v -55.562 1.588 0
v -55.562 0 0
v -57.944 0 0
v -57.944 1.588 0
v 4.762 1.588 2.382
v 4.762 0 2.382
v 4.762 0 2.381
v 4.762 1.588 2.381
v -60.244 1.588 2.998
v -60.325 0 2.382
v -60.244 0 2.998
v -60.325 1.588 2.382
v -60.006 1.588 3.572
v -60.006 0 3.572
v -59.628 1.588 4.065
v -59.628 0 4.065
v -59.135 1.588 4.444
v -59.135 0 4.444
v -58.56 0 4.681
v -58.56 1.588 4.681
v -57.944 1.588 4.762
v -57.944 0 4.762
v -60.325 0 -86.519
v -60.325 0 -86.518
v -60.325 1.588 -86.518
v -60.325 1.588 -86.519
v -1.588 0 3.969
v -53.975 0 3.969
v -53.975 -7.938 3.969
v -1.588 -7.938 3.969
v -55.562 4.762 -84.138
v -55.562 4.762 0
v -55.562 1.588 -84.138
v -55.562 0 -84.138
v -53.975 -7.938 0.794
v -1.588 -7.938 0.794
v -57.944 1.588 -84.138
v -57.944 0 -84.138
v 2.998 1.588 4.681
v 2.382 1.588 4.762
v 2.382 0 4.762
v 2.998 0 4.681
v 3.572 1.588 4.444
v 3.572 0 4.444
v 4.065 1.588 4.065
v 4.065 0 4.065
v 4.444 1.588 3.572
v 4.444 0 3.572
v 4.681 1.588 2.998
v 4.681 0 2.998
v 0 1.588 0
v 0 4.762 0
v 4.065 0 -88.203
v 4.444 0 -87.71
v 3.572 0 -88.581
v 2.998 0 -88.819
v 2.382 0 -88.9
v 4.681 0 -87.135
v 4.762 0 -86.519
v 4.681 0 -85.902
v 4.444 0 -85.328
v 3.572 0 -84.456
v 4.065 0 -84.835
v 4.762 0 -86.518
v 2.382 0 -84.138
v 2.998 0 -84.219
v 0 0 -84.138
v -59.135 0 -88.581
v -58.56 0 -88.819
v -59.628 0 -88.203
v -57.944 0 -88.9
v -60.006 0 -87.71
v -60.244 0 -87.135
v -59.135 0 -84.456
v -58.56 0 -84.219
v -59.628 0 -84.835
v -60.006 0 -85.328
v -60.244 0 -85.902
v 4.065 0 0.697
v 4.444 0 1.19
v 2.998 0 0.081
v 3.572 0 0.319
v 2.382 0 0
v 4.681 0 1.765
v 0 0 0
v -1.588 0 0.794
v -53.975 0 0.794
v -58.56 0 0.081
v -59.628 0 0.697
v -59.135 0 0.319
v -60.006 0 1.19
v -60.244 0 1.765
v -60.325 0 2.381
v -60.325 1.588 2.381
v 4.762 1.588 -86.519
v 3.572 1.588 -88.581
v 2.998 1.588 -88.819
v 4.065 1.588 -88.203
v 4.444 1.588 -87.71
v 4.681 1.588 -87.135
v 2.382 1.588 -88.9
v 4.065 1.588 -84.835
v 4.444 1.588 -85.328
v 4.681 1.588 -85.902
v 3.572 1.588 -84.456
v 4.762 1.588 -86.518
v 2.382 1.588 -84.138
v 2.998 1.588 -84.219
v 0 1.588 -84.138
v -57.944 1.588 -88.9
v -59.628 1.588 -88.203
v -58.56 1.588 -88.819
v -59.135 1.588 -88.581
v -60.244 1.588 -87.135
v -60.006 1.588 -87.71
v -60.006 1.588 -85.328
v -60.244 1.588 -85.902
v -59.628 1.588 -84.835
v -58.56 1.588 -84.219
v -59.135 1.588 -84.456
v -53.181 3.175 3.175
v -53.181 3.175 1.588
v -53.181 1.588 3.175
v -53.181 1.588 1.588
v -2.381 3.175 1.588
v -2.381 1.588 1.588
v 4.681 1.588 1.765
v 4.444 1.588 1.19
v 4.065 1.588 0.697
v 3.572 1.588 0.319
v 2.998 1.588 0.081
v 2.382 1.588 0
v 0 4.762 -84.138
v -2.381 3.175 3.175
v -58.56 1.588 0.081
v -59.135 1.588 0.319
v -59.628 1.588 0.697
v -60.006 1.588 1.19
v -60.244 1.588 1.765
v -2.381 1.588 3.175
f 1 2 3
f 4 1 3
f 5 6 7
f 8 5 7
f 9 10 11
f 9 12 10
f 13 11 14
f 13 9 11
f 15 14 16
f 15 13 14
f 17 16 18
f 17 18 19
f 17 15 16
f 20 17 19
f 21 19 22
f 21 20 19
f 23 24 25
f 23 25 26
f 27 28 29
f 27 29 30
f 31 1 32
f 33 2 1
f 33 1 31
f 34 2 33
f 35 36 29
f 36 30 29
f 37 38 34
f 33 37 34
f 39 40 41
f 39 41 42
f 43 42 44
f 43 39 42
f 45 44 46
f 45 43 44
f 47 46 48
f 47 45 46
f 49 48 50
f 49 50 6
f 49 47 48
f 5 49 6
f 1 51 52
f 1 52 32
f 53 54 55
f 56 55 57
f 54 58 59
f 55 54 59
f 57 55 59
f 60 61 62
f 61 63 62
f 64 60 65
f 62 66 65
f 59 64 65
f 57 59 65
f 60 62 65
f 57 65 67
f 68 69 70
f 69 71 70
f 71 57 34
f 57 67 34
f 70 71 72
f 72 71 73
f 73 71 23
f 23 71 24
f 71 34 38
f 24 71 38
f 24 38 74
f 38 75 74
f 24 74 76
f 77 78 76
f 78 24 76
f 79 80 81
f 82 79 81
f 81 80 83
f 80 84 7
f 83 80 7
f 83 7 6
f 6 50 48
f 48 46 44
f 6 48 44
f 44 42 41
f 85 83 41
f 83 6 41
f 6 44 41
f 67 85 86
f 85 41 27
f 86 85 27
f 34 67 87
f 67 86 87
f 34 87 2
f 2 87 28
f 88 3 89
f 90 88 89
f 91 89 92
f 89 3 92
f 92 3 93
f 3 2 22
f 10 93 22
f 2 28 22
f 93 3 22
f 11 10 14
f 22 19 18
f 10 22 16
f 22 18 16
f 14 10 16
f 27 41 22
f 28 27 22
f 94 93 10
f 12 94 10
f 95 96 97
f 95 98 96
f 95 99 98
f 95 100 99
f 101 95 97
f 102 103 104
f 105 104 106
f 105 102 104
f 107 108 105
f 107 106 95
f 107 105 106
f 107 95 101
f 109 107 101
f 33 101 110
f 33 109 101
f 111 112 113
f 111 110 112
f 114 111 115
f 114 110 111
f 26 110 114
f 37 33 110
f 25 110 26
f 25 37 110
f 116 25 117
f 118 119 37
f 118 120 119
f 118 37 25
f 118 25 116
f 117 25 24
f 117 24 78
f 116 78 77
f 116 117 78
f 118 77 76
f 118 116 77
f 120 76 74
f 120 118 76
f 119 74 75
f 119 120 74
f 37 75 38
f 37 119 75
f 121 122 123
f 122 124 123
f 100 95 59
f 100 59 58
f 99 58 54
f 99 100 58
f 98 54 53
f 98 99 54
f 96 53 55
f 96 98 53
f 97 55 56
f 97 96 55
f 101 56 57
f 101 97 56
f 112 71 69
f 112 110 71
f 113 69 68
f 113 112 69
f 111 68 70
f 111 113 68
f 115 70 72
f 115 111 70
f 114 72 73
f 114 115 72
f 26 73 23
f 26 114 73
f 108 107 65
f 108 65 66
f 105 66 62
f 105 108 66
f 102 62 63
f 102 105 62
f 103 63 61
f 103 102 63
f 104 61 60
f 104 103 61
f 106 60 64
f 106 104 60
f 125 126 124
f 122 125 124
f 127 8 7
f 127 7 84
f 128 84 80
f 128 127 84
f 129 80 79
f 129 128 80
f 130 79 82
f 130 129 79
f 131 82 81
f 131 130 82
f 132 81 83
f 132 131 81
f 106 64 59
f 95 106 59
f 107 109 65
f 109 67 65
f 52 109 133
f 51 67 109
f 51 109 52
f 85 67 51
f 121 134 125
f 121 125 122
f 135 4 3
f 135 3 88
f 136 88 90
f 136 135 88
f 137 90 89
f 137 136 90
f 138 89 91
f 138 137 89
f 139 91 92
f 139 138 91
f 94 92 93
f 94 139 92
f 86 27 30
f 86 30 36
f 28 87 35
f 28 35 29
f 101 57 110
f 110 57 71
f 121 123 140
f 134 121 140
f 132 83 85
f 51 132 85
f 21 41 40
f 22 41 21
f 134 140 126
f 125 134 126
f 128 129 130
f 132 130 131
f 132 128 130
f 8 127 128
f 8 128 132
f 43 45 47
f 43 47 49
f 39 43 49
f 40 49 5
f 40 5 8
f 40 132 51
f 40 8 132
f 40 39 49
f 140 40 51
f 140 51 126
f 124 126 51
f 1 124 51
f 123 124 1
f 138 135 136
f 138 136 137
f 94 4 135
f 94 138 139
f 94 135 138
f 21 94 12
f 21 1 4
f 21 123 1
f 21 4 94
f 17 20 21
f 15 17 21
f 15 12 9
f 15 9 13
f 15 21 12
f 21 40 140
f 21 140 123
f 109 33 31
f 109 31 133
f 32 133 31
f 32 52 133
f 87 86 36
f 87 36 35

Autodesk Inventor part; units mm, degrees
ref_plane "YZ Plane" through (0, 0, 0) normal (1, 0, 0) x (0, 1, 0)
ref_plane "XZ Plane" through (0, 0, 0) normal (0, 1, 0) x (-1, 0, 0)
ref_plane "XY Plane" through (0, 0, 0) normal (0, 0, 1) x (1, 0, 0)
sketch "Sketch1" plane through (0, 0, 0) normal (0, 1, 0) x (-1, 0, 0)
  line L0 (0, 0) -> (55.5625, 0)
  line L1 (55.5625, 0) -> (55.5625, -84.1375)
  line L2 (55.5625, -84.1375) -> (0, -84.1375)
  line L3 (0, -84.1375) -> (0, 0)
  line L4 (55.5625, 0) -> (0, 0)
  line L5 (0, 0) -> (0, 4.7625)
  line L6 (0, 4.7625) -> (55.5625, 4.7625)
  line L7 (55.5625, 4.7625) -> (55.5625, 0)
  line L8 (55.5625, -84.1375) -> (0, -84.1375)
  line L9 (0, -84.1375) -> (0, -88.9)
  line L10 (0, -88.9) -> (55.5625, -88.9)
  line L11 (55.5625, -88.9) -> (55.5625, -84.1375)
  line L12 (55.5625, 4.7625) -> (60.325, 4.7625)
  line L13 (55.5625, 1.7145) -> (55.5625, 4.7625)
  line L14 (55.5625, -84.1375) -> (60.325, -84.1375)
  line L15 (60.325, -84.1375) -> (60.325, -88.9)
  line L16 (60.325, -88.9) -> (55.5625, -88.9)
  line L17 (55.5625, -88.9) -> (55.5625, -84.1375)
  line L18 (0, -84.1375) -> (-4.7625, -84.1375)
  line L19 (-4.7625, -84.1375) -> (-4.7625, -88.9)
  line L20 (-4.7625, -88.9) -> (0, -88.9)
  line L21 (0, -88.9) -> (0, -84.1375)
  line L22 (0, 4.7625) -> (-4.7625, 4.7625)
  line L23 (-4.7625, 4.7625) -> (-4.7625, 1.7145)
  line L24 (0, 1.7145) -> (0, 4.7625)
  line L25 (53.1812, 3.175) -> (2.3812, 3.175)
  line L26 (2.3812, 3.175) -> (2.3812, 1.5875)
  line L27 (2.3812, 1.5875) -> (53.1812, 1.5875)
  line L28 (53.1812, 1.5875) -> (53.1812, 3.175)
  line L29 (53.975, 3.9687) -> (1.5875, 3.9687)
  line L30 (1.5875, 3.9687) -> (1.5875, 0.7938)
  line L31 (1.5875, 0.7938) -> (53.975, 0.7938)
  line L32 (53.975, 0.7938) -> (53.975, 3.9687)
  line L33 (60.325, 4.7625) -> (55.5625, 4.7625)
  line L34 (55.5625, 4.7625) -> (55.5625, 0)
  line L35 (55.5625, 0) -> (60.325, 0)
  line L36 (60.325, 0) -> (60.325, 4.7625)
  line L37 (0, 4.7625) -> (-4.7625, 4.7625)
  line L38 (-4.7625, 4.7625) -> (-4.7625, 0)
  line L39 (-4.7625, 0) -> (0, 0)
  line L40 (0, 0) -> (0, 4.7625)
  point P0 (55.5625, 2.3813)
  point P1 (0, -88.9)
  point P2 (-4.7625, 1.7145)
  dimension "d0" = 55.5625
  dimension "d1" = 84.1375
  dimension "d2" = 55.5625
  dimension "d4" = 55.5625
  dimension "d7" = 4.7625
  dimension "d8" = 4.7625
  dimension "d9" = 4.7625
  dimension "d10" = 50.8
  dimension "d12" = 1.5875
  dimension "d13" = 1.5875
  dimension "d14" = 2.3813
  dimension "d15" = 0.7937
extrude "Extrusion1" add sketch "Sketch1" along normal blind 4.7625 contours L0 L1 L2 L3
extrude "Extrusion2" add sketch "Sketch1" along normal blind 1.5875 contours L5 L6 L7 L0 | L2 L11 L10 L9 | L9 L20 L19 L18 | L14 L15 L16 L11 | L28 L27 L26 L25 | L32 L31 L30 L29
extrude "Extrusion3" add sketch "Sketch1" along normal blind 1.5875 contours L39 L38 L23 L22 L5 | L7 L12 L36 L35
extrude "Extrusion4" add sketch "Sketch1" along normal blind 3.175 contours L28 L27 L26 L25
extrude "Extrusion5" add sketch "Sketch1" against normal blind 7.9375 contours L28 L27 L26 L25 | L32 L31 L30 L29
fillet "Fillet1" radius 2.3813 8 edges at (-60.325, 0.7937, 4.7625) (-60.325, 0.7937, 0) (4.7625, 0.7937, 4.7625) (4.7625, 0.7937, 0) (4.7625, 0.7937, -84.1375) (4.7625, 0.7937, -88.9) (-60.325, 0.7937, -88.9) (-60.325, 0.7937, -84.1375)
properties part number "LCD_Display"
